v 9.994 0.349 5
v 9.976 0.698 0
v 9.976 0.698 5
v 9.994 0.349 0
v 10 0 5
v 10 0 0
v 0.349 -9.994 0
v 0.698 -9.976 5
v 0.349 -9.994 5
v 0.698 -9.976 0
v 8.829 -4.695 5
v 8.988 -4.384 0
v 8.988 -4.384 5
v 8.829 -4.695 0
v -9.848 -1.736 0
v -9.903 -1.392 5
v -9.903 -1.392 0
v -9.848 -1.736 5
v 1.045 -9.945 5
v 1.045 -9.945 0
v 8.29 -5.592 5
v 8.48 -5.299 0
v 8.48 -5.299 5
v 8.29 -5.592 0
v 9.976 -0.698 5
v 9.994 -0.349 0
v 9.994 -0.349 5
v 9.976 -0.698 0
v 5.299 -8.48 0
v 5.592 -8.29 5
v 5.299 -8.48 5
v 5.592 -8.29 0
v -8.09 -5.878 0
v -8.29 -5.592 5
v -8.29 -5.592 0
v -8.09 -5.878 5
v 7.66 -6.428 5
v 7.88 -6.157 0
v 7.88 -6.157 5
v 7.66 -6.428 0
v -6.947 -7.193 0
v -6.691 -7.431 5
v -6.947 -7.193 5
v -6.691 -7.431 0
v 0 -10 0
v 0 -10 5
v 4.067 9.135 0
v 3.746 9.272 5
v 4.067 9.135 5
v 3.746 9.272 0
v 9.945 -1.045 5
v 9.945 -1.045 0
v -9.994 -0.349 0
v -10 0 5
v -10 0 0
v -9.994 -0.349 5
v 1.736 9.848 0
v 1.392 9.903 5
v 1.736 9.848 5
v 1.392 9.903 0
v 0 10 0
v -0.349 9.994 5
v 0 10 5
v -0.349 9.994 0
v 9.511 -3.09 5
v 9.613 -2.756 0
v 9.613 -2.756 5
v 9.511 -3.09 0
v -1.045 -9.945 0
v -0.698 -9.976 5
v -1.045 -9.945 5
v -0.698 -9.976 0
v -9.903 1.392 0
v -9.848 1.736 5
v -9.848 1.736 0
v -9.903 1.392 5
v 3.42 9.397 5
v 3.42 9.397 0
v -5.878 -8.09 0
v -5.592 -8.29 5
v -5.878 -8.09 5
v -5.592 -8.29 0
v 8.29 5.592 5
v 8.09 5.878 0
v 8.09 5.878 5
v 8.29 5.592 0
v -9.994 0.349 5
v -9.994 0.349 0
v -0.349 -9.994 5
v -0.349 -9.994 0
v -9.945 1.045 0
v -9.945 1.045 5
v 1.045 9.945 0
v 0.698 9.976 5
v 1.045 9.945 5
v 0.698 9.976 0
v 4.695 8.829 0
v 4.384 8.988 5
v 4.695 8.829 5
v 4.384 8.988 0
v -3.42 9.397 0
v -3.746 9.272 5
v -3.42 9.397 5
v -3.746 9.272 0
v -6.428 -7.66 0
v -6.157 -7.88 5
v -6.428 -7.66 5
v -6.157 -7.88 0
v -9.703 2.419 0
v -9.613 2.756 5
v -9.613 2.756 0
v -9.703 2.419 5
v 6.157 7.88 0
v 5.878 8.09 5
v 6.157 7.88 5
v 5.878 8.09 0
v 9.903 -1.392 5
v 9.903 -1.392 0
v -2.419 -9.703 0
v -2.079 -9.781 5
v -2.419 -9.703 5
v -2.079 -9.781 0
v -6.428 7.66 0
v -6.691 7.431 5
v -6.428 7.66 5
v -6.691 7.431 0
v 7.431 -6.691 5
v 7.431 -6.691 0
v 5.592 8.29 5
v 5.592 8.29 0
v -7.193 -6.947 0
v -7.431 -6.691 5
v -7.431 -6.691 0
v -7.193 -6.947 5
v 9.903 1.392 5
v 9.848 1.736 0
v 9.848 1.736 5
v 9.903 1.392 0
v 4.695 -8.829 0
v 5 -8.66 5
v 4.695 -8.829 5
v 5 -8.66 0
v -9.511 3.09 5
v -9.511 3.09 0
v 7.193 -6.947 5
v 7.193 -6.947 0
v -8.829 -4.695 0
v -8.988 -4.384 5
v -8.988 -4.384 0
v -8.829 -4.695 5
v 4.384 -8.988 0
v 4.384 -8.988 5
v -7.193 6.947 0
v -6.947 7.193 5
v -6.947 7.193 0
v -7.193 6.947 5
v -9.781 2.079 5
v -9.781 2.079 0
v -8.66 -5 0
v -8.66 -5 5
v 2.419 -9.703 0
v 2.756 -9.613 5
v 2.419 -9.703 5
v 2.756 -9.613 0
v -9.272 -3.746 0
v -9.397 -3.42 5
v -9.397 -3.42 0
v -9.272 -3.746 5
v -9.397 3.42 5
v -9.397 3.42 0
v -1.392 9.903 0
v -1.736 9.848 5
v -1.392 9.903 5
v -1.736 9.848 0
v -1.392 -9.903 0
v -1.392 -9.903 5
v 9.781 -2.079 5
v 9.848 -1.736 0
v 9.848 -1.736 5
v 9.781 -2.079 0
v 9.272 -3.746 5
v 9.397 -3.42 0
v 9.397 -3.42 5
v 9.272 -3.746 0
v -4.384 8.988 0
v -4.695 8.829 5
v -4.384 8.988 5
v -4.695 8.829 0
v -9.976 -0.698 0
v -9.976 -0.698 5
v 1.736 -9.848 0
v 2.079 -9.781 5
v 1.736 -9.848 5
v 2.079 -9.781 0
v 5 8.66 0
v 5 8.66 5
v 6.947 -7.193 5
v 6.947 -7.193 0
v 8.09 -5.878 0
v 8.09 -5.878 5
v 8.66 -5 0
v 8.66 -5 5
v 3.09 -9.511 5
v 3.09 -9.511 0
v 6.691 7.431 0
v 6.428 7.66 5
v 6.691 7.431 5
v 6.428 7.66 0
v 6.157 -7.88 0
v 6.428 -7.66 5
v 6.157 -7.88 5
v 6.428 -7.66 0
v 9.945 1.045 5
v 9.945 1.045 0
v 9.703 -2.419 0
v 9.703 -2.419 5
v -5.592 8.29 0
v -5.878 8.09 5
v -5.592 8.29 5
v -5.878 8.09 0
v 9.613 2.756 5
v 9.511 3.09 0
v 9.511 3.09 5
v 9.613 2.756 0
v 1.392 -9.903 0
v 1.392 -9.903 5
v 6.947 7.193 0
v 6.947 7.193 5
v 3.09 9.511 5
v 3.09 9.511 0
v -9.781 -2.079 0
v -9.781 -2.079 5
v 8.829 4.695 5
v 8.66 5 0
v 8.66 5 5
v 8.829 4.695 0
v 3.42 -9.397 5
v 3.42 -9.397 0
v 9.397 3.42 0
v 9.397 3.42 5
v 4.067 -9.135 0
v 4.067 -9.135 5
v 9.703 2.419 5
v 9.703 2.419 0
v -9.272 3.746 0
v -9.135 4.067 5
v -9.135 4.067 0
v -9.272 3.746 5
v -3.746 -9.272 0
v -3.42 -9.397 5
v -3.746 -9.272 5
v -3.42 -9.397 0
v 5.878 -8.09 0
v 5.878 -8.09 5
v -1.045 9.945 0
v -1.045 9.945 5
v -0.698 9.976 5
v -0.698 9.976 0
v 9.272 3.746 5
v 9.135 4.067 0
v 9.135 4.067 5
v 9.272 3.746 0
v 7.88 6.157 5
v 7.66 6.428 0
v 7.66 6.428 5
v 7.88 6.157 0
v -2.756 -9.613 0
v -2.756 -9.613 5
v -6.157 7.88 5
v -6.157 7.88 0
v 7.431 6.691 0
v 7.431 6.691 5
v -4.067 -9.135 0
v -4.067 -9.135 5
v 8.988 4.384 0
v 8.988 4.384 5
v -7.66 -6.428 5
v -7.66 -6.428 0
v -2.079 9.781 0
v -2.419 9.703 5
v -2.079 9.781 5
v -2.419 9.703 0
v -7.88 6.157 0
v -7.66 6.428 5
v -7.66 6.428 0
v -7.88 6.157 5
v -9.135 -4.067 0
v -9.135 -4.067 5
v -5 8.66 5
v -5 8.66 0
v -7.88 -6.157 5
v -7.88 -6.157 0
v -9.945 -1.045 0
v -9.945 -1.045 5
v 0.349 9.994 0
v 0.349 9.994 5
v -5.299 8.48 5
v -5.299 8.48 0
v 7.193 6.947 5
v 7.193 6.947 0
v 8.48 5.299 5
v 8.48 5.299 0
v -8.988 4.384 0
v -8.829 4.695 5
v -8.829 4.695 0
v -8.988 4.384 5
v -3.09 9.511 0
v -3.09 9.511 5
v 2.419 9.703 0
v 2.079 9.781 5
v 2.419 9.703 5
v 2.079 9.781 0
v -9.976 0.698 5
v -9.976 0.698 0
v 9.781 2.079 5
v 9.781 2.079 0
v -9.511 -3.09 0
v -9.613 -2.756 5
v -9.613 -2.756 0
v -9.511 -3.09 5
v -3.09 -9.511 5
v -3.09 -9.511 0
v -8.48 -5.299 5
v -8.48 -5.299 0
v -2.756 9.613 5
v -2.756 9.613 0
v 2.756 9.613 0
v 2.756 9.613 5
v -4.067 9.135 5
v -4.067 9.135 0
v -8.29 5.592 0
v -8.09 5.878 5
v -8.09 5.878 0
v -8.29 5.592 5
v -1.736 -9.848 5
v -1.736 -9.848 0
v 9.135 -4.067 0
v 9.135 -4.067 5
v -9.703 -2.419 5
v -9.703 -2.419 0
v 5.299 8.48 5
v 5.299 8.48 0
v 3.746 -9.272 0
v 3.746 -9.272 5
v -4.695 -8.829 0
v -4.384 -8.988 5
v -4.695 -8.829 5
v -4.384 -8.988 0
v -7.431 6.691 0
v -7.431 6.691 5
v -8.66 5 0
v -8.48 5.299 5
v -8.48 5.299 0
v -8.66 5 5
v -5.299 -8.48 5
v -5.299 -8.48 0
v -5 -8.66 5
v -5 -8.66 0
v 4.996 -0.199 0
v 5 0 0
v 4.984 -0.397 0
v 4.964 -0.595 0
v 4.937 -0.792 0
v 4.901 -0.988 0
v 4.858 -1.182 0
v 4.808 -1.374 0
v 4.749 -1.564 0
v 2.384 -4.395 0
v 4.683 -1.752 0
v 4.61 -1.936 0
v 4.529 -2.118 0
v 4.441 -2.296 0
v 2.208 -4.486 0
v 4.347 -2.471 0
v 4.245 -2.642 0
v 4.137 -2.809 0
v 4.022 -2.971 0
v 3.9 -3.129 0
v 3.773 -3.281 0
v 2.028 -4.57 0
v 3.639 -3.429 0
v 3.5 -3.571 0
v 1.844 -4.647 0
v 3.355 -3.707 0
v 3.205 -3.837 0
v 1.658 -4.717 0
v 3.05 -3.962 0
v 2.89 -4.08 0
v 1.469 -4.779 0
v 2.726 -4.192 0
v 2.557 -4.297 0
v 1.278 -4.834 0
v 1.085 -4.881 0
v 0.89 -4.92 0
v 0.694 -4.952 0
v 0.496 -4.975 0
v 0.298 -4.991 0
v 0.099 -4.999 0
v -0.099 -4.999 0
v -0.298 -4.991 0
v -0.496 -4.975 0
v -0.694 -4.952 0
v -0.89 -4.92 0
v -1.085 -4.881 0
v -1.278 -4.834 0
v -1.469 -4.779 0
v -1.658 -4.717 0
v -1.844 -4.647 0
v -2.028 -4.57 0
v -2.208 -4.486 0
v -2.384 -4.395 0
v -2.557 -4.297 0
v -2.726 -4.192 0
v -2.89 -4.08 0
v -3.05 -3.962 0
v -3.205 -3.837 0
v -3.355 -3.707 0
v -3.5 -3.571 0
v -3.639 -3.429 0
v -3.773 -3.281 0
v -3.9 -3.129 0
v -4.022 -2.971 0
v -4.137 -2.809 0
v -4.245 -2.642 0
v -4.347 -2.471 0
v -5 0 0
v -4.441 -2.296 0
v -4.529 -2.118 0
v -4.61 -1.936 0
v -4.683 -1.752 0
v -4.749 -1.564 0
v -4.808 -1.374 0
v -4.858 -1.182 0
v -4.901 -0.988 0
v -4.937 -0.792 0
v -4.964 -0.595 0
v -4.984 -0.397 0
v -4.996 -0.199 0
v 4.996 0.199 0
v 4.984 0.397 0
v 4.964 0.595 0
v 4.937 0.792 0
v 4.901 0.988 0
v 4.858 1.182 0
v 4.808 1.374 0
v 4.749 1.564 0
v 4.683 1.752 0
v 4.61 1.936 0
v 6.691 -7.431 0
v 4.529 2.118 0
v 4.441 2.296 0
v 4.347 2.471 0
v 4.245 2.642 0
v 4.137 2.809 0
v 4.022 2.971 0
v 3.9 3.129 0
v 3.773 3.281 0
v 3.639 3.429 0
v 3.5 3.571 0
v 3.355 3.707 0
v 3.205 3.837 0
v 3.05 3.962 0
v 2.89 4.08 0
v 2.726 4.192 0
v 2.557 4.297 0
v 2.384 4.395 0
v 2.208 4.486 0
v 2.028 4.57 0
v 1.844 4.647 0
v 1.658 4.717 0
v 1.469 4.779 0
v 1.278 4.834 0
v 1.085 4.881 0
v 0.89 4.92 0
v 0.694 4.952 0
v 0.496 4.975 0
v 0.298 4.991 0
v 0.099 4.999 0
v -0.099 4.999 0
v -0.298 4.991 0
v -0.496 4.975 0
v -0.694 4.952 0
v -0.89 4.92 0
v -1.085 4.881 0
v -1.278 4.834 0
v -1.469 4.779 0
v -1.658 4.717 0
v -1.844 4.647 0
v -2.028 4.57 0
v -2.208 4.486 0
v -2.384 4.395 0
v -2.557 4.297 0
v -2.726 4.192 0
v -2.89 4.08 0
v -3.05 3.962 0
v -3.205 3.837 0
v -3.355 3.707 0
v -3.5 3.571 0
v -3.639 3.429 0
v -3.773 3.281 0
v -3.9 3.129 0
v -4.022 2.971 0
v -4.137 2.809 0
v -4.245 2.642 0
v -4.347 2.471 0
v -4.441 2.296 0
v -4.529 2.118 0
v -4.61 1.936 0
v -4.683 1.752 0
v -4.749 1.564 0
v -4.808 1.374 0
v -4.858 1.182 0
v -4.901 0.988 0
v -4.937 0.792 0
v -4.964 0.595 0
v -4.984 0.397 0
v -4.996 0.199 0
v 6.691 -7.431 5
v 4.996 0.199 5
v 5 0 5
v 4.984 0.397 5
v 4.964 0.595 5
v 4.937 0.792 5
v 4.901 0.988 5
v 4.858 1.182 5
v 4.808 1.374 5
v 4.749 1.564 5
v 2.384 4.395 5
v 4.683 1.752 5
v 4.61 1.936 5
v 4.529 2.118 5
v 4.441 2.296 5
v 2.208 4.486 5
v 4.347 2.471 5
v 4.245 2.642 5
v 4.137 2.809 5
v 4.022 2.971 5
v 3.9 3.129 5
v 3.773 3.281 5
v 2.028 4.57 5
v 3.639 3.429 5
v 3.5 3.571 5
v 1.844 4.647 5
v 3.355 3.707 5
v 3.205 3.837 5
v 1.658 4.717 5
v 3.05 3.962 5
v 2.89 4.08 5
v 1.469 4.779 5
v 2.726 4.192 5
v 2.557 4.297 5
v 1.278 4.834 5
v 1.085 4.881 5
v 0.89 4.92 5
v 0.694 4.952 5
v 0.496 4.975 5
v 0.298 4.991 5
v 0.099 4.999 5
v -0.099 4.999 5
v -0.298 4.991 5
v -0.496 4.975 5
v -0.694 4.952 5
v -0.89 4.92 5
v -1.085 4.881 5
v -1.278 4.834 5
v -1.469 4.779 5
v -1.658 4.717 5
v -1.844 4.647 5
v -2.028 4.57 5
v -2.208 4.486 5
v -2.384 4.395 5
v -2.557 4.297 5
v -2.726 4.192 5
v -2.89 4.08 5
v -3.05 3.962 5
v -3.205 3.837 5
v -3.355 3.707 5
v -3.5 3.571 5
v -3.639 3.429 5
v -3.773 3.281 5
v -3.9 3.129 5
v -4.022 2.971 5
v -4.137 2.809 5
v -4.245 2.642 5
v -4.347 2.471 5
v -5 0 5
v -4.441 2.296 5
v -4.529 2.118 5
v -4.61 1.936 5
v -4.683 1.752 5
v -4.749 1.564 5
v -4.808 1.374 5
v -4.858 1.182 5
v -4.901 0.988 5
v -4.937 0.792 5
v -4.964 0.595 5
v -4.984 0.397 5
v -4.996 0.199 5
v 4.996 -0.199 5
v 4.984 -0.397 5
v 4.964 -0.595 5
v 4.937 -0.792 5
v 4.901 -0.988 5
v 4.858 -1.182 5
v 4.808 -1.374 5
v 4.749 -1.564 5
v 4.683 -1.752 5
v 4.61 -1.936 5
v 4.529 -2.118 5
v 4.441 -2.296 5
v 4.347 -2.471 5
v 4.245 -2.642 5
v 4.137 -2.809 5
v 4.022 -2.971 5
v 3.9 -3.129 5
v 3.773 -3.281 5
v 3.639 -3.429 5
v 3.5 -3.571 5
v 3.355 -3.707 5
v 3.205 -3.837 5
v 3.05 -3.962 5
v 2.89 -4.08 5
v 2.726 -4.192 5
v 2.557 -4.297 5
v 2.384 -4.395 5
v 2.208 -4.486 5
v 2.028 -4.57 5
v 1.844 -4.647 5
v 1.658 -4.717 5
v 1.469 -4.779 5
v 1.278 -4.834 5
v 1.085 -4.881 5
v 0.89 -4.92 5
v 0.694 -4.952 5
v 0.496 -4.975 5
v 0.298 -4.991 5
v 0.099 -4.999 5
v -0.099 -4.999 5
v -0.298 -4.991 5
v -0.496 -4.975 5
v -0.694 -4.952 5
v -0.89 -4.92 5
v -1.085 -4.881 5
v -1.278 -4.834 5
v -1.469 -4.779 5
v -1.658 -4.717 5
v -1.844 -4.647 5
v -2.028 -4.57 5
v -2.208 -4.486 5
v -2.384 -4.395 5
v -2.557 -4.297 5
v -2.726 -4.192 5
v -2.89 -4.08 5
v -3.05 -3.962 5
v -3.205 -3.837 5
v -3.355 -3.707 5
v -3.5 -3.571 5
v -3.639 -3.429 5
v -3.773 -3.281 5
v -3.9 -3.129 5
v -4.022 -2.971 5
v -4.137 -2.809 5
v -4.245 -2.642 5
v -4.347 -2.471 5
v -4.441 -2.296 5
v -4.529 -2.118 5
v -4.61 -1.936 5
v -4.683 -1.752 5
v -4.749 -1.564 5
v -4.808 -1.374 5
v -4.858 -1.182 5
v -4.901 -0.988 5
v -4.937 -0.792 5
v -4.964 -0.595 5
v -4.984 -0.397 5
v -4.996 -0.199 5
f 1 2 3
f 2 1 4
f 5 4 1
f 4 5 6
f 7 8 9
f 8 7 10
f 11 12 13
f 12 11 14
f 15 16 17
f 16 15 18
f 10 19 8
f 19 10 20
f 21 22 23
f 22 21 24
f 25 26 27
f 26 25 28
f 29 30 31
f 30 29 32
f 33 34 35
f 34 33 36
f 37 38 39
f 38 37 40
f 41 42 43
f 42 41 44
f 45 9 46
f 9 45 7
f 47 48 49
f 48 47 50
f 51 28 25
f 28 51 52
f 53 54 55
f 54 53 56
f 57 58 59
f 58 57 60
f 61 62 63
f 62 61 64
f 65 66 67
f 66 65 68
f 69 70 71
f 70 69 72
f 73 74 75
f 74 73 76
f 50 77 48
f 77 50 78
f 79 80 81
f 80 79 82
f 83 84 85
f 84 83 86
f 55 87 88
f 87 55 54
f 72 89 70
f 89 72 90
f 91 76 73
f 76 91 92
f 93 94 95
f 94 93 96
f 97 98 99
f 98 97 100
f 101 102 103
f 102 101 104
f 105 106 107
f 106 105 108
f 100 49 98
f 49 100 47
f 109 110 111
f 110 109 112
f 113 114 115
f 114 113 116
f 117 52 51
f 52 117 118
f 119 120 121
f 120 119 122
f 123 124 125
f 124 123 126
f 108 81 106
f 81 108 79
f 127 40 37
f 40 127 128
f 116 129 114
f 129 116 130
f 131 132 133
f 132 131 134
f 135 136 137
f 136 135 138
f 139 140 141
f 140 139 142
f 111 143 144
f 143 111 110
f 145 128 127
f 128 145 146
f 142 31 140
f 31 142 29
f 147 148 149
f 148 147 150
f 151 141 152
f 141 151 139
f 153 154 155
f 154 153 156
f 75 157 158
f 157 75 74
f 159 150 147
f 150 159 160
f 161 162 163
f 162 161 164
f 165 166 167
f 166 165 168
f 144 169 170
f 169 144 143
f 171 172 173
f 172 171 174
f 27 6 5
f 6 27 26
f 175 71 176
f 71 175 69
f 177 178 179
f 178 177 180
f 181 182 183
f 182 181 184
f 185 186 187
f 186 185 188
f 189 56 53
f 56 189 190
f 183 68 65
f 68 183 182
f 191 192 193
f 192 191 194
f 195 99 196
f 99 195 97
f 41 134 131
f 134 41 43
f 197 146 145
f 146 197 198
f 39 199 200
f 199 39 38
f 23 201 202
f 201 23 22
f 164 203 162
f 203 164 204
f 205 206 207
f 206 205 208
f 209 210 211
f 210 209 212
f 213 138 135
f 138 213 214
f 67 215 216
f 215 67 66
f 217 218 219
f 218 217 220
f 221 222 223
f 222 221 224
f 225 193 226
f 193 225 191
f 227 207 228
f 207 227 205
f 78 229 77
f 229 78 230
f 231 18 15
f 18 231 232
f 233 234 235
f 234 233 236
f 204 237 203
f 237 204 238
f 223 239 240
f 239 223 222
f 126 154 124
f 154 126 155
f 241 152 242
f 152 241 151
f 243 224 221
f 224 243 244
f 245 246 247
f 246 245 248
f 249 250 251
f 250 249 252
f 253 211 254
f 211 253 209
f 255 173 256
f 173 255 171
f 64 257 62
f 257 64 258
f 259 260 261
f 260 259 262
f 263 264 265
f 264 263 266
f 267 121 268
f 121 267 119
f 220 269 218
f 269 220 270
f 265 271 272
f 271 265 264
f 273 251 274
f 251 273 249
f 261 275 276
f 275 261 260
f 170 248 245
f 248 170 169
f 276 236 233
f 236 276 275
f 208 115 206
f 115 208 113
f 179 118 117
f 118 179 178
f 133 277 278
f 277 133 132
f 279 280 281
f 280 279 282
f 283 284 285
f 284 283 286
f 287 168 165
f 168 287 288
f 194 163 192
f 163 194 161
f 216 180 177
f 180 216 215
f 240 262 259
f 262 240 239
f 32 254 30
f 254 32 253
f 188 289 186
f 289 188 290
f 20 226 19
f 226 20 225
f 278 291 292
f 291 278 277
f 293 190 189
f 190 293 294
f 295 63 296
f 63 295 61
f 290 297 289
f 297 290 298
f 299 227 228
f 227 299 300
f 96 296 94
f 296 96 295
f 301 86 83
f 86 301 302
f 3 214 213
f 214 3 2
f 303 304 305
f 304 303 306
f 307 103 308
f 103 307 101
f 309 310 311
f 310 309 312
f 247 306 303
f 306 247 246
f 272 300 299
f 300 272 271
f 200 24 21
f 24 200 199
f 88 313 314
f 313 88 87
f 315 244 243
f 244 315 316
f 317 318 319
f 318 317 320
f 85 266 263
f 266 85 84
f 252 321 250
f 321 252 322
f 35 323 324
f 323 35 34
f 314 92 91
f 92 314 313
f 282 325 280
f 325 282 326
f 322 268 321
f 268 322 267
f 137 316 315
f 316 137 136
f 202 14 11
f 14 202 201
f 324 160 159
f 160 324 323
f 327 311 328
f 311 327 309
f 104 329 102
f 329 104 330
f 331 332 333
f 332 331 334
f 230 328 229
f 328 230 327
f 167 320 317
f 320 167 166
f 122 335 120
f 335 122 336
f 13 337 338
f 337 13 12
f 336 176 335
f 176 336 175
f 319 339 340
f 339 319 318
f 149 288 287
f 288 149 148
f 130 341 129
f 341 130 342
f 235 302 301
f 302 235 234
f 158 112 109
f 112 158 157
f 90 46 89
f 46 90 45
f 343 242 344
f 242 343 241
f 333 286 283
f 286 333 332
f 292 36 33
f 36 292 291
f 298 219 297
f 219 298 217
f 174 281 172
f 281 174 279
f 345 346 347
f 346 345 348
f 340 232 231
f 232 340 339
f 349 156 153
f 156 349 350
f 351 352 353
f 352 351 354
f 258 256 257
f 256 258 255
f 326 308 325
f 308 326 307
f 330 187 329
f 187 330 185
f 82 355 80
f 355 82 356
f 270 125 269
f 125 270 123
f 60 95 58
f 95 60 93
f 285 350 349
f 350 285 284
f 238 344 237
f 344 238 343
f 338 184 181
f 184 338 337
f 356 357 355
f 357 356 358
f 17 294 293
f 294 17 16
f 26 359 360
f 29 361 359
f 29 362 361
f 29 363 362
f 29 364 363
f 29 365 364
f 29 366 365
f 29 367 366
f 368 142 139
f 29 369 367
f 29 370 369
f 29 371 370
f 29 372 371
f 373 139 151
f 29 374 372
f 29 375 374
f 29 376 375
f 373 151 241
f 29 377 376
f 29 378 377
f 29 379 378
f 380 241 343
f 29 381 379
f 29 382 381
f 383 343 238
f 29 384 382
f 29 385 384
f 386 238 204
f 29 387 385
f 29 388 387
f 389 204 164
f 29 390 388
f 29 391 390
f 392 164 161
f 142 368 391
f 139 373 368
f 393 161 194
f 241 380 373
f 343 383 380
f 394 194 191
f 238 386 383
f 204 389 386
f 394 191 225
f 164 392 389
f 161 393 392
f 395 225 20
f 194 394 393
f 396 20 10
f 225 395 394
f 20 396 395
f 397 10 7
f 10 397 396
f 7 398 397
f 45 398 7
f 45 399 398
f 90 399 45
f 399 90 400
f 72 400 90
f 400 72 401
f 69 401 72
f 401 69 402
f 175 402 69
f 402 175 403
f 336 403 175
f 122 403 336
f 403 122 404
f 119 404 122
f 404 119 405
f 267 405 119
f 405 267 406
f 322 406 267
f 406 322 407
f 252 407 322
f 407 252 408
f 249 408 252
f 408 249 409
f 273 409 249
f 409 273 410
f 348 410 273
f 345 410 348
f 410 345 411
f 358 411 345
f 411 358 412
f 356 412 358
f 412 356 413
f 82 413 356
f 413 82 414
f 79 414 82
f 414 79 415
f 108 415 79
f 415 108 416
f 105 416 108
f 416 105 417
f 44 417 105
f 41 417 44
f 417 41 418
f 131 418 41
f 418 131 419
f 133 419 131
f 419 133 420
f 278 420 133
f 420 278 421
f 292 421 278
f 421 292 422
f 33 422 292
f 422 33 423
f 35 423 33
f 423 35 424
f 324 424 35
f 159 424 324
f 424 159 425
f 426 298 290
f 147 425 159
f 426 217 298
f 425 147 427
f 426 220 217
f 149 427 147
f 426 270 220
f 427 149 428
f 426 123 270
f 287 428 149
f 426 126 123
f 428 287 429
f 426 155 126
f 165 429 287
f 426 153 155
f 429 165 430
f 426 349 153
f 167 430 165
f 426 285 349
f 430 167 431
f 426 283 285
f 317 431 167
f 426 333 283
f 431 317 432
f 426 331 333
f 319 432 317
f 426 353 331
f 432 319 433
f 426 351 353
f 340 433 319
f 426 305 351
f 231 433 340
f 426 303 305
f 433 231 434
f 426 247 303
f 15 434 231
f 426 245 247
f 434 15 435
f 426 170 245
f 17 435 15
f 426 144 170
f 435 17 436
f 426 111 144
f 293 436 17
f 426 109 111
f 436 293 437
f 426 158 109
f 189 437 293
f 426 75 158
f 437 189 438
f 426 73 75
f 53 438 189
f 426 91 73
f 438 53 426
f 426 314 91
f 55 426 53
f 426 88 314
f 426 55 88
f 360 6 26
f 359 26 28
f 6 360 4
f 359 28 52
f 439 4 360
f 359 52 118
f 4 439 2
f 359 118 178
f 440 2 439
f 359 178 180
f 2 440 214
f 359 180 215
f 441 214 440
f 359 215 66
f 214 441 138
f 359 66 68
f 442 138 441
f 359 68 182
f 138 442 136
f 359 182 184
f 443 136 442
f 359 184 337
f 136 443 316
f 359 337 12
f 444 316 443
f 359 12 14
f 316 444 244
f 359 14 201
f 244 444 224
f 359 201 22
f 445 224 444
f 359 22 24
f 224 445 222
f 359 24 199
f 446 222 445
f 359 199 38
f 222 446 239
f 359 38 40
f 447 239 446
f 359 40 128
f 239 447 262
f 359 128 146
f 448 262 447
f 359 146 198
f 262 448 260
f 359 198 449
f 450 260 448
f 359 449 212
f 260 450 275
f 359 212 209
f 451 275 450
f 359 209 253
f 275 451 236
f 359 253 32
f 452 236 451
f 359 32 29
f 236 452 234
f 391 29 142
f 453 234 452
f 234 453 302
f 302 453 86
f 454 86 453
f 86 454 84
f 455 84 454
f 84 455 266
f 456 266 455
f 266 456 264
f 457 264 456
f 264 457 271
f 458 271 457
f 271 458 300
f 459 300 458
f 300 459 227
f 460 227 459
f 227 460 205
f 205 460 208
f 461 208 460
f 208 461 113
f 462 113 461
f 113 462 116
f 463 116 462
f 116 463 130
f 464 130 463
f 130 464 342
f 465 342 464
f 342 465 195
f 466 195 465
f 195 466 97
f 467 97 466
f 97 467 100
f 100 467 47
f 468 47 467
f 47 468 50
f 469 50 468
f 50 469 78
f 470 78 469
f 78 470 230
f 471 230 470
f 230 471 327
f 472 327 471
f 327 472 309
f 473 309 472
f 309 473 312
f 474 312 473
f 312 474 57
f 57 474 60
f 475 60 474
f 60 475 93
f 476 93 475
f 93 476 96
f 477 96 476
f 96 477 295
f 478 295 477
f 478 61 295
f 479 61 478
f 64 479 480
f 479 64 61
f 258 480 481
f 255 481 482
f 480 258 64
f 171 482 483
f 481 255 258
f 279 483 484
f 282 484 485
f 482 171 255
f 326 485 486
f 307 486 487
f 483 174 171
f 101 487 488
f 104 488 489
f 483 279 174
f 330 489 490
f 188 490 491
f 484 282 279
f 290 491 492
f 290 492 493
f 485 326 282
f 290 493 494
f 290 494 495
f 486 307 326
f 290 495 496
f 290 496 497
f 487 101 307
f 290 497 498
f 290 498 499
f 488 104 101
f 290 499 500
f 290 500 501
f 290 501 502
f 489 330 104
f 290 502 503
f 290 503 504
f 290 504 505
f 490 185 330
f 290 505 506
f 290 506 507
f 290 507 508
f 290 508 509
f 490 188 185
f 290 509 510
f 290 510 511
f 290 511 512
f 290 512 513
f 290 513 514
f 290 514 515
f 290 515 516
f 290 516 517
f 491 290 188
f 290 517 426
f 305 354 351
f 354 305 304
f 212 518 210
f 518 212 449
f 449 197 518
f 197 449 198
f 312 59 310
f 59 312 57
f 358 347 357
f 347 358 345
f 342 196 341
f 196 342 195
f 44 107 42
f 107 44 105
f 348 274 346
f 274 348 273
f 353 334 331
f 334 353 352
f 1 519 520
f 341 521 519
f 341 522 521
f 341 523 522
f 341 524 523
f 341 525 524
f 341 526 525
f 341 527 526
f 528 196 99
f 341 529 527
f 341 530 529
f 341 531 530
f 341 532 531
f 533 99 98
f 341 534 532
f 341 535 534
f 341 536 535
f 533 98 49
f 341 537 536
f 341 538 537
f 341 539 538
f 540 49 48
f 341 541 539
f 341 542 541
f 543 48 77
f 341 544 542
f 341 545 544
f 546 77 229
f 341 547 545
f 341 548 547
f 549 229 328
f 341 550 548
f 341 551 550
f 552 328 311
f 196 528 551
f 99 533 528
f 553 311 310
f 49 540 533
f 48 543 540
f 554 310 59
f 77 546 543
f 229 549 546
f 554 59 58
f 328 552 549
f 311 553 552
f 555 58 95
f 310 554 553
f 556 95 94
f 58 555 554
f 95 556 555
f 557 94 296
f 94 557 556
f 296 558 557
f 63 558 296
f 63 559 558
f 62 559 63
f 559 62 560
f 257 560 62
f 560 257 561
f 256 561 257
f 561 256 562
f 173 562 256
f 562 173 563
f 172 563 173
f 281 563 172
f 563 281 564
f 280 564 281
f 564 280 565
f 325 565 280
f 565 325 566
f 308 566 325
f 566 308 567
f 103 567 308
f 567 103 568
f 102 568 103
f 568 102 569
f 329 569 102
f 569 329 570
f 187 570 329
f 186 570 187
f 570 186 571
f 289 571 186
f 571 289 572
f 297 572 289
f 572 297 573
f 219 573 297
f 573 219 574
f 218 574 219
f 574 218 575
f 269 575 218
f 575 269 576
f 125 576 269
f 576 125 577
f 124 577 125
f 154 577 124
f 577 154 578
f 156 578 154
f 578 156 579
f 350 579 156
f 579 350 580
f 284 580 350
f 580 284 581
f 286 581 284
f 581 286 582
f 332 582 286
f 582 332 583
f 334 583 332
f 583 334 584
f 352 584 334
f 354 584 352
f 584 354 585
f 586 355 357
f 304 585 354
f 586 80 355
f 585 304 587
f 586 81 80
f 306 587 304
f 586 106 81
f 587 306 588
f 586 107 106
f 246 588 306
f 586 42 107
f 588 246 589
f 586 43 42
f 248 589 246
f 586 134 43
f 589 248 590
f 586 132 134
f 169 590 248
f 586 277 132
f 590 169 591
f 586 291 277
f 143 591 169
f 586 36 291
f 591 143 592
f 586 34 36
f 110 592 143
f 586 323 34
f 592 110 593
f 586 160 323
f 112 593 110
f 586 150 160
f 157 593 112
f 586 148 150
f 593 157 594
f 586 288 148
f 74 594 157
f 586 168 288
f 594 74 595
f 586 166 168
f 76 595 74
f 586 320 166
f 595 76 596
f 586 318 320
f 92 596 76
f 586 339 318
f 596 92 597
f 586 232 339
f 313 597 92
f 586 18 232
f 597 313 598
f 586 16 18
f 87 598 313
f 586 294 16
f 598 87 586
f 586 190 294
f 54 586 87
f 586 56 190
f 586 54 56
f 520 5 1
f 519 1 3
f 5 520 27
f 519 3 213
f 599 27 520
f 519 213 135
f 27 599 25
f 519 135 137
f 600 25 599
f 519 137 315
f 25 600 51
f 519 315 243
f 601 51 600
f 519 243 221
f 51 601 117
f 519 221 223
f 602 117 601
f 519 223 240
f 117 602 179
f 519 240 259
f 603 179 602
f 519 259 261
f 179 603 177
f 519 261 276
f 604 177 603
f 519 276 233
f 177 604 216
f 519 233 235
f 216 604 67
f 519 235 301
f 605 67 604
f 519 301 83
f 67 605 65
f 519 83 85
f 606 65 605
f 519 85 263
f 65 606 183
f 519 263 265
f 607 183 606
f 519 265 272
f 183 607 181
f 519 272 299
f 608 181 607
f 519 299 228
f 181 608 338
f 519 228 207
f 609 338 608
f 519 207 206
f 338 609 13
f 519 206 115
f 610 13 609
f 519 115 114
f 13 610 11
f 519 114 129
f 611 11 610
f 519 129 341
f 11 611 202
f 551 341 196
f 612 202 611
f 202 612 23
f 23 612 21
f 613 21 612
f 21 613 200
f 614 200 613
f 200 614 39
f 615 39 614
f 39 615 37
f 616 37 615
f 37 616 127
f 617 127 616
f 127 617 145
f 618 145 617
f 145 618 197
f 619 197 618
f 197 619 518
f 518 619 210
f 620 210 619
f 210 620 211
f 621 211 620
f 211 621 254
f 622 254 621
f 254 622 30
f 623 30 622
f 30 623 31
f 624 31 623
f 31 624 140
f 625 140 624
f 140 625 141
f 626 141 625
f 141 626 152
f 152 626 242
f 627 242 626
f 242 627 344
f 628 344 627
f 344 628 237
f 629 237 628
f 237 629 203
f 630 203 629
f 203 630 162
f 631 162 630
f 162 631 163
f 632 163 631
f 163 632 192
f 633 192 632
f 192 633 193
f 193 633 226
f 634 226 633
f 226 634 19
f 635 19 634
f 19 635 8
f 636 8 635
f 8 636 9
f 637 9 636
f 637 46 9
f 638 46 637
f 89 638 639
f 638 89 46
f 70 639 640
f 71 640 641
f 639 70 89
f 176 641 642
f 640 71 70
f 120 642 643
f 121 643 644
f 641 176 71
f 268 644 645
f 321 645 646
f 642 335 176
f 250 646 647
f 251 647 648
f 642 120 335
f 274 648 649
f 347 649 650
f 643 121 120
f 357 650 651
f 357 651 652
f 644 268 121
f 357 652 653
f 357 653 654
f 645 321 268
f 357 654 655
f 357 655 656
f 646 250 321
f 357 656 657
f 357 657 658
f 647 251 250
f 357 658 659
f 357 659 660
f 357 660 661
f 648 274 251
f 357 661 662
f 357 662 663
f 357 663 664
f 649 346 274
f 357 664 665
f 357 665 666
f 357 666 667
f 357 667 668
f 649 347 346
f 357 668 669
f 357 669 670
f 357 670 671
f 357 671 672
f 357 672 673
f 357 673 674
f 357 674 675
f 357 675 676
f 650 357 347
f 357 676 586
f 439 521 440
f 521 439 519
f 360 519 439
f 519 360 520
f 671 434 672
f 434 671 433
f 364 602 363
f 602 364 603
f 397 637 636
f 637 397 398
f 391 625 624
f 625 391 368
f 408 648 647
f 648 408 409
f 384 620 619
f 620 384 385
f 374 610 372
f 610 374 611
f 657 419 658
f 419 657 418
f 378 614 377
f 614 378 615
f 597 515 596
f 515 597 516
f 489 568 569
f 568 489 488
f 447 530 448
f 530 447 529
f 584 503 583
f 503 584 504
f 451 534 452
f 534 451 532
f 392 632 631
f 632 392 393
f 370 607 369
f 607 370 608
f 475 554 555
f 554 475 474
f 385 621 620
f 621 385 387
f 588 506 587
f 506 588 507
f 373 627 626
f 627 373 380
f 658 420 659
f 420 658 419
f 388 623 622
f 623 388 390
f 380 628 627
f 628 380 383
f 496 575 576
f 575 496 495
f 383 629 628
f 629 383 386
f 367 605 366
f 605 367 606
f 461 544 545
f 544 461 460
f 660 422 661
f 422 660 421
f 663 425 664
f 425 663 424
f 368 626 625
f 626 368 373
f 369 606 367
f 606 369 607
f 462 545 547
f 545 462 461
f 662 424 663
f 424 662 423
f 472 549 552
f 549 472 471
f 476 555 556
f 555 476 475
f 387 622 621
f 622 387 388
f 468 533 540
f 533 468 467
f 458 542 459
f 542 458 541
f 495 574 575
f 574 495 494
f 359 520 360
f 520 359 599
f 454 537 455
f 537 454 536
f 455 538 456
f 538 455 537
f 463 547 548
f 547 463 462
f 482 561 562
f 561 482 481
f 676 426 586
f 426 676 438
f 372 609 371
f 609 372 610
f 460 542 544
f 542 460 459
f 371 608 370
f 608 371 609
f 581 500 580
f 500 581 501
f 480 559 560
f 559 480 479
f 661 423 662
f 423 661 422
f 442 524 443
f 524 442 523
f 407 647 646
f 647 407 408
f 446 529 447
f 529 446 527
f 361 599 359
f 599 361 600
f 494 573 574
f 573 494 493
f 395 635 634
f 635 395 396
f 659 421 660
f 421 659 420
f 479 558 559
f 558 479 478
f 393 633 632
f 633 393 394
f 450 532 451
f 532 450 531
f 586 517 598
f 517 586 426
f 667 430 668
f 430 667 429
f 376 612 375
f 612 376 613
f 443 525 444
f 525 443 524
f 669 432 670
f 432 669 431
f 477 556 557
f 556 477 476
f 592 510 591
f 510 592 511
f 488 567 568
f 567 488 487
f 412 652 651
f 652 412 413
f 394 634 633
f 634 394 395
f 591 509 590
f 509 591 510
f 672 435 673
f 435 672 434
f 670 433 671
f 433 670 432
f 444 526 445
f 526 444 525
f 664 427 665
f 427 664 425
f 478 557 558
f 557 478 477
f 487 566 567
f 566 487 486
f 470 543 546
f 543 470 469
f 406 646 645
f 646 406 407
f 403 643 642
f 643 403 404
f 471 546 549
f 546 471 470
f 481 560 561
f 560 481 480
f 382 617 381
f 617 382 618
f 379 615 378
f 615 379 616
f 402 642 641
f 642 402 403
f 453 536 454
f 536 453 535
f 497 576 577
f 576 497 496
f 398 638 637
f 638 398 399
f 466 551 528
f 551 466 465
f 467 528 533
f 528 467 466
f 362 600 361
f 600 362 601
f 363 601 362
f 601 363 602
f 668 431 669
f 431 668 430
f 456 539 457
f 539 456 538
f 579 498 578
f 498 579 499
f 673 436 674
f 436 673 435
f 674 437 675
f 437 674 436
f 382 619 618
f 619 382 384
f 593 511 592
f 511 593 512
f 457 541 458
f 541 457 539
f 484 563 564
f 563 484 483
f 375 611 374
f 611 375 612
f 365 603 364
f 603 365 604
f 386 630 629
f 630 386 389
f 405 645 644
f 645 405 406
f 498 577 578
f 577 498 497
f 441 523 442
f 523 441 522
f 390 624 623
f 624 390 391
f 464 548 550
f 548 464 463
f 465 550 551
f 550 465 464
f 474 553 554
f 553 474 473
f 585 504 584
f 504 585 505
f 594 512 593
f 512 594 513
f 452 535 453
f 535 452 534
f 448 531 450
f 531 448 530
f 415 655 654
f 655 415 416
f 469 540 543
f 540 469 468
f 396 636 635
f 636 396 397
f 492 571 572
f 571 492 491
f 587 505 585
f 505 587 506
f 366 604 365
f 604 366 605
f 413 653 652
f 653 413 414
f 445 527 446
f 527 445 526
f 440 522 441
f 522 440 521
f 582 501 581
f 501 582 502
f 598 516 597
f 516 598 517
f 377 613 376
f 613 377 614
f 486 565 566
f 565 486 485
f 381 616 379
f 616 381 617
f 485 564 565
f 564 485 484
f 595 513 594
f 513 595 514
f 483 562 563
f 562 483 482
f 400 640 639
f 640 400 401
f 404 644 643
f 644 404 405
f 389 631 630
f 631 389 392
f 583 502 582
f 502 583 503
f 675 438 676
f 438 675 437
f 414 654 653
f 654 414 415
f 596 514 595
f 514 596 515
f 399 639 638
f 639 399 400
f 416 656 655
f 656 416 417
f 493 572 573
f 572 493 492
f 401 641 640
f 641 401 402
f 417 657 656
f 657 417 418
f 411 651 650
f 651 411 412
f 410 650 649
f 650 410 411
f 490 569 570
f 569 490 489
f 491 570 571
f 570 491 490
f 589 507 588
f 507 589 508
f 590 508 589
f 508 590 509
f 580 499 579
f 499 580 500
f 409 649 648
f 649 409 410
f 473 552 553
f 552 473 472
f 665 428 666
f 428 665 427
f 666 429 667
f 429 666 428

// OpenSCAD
$fa = 2;
$fs = 0.2;

difference() {
	cylinder(r=10, h=5);
	cylinder(r=5, h=5);
}
